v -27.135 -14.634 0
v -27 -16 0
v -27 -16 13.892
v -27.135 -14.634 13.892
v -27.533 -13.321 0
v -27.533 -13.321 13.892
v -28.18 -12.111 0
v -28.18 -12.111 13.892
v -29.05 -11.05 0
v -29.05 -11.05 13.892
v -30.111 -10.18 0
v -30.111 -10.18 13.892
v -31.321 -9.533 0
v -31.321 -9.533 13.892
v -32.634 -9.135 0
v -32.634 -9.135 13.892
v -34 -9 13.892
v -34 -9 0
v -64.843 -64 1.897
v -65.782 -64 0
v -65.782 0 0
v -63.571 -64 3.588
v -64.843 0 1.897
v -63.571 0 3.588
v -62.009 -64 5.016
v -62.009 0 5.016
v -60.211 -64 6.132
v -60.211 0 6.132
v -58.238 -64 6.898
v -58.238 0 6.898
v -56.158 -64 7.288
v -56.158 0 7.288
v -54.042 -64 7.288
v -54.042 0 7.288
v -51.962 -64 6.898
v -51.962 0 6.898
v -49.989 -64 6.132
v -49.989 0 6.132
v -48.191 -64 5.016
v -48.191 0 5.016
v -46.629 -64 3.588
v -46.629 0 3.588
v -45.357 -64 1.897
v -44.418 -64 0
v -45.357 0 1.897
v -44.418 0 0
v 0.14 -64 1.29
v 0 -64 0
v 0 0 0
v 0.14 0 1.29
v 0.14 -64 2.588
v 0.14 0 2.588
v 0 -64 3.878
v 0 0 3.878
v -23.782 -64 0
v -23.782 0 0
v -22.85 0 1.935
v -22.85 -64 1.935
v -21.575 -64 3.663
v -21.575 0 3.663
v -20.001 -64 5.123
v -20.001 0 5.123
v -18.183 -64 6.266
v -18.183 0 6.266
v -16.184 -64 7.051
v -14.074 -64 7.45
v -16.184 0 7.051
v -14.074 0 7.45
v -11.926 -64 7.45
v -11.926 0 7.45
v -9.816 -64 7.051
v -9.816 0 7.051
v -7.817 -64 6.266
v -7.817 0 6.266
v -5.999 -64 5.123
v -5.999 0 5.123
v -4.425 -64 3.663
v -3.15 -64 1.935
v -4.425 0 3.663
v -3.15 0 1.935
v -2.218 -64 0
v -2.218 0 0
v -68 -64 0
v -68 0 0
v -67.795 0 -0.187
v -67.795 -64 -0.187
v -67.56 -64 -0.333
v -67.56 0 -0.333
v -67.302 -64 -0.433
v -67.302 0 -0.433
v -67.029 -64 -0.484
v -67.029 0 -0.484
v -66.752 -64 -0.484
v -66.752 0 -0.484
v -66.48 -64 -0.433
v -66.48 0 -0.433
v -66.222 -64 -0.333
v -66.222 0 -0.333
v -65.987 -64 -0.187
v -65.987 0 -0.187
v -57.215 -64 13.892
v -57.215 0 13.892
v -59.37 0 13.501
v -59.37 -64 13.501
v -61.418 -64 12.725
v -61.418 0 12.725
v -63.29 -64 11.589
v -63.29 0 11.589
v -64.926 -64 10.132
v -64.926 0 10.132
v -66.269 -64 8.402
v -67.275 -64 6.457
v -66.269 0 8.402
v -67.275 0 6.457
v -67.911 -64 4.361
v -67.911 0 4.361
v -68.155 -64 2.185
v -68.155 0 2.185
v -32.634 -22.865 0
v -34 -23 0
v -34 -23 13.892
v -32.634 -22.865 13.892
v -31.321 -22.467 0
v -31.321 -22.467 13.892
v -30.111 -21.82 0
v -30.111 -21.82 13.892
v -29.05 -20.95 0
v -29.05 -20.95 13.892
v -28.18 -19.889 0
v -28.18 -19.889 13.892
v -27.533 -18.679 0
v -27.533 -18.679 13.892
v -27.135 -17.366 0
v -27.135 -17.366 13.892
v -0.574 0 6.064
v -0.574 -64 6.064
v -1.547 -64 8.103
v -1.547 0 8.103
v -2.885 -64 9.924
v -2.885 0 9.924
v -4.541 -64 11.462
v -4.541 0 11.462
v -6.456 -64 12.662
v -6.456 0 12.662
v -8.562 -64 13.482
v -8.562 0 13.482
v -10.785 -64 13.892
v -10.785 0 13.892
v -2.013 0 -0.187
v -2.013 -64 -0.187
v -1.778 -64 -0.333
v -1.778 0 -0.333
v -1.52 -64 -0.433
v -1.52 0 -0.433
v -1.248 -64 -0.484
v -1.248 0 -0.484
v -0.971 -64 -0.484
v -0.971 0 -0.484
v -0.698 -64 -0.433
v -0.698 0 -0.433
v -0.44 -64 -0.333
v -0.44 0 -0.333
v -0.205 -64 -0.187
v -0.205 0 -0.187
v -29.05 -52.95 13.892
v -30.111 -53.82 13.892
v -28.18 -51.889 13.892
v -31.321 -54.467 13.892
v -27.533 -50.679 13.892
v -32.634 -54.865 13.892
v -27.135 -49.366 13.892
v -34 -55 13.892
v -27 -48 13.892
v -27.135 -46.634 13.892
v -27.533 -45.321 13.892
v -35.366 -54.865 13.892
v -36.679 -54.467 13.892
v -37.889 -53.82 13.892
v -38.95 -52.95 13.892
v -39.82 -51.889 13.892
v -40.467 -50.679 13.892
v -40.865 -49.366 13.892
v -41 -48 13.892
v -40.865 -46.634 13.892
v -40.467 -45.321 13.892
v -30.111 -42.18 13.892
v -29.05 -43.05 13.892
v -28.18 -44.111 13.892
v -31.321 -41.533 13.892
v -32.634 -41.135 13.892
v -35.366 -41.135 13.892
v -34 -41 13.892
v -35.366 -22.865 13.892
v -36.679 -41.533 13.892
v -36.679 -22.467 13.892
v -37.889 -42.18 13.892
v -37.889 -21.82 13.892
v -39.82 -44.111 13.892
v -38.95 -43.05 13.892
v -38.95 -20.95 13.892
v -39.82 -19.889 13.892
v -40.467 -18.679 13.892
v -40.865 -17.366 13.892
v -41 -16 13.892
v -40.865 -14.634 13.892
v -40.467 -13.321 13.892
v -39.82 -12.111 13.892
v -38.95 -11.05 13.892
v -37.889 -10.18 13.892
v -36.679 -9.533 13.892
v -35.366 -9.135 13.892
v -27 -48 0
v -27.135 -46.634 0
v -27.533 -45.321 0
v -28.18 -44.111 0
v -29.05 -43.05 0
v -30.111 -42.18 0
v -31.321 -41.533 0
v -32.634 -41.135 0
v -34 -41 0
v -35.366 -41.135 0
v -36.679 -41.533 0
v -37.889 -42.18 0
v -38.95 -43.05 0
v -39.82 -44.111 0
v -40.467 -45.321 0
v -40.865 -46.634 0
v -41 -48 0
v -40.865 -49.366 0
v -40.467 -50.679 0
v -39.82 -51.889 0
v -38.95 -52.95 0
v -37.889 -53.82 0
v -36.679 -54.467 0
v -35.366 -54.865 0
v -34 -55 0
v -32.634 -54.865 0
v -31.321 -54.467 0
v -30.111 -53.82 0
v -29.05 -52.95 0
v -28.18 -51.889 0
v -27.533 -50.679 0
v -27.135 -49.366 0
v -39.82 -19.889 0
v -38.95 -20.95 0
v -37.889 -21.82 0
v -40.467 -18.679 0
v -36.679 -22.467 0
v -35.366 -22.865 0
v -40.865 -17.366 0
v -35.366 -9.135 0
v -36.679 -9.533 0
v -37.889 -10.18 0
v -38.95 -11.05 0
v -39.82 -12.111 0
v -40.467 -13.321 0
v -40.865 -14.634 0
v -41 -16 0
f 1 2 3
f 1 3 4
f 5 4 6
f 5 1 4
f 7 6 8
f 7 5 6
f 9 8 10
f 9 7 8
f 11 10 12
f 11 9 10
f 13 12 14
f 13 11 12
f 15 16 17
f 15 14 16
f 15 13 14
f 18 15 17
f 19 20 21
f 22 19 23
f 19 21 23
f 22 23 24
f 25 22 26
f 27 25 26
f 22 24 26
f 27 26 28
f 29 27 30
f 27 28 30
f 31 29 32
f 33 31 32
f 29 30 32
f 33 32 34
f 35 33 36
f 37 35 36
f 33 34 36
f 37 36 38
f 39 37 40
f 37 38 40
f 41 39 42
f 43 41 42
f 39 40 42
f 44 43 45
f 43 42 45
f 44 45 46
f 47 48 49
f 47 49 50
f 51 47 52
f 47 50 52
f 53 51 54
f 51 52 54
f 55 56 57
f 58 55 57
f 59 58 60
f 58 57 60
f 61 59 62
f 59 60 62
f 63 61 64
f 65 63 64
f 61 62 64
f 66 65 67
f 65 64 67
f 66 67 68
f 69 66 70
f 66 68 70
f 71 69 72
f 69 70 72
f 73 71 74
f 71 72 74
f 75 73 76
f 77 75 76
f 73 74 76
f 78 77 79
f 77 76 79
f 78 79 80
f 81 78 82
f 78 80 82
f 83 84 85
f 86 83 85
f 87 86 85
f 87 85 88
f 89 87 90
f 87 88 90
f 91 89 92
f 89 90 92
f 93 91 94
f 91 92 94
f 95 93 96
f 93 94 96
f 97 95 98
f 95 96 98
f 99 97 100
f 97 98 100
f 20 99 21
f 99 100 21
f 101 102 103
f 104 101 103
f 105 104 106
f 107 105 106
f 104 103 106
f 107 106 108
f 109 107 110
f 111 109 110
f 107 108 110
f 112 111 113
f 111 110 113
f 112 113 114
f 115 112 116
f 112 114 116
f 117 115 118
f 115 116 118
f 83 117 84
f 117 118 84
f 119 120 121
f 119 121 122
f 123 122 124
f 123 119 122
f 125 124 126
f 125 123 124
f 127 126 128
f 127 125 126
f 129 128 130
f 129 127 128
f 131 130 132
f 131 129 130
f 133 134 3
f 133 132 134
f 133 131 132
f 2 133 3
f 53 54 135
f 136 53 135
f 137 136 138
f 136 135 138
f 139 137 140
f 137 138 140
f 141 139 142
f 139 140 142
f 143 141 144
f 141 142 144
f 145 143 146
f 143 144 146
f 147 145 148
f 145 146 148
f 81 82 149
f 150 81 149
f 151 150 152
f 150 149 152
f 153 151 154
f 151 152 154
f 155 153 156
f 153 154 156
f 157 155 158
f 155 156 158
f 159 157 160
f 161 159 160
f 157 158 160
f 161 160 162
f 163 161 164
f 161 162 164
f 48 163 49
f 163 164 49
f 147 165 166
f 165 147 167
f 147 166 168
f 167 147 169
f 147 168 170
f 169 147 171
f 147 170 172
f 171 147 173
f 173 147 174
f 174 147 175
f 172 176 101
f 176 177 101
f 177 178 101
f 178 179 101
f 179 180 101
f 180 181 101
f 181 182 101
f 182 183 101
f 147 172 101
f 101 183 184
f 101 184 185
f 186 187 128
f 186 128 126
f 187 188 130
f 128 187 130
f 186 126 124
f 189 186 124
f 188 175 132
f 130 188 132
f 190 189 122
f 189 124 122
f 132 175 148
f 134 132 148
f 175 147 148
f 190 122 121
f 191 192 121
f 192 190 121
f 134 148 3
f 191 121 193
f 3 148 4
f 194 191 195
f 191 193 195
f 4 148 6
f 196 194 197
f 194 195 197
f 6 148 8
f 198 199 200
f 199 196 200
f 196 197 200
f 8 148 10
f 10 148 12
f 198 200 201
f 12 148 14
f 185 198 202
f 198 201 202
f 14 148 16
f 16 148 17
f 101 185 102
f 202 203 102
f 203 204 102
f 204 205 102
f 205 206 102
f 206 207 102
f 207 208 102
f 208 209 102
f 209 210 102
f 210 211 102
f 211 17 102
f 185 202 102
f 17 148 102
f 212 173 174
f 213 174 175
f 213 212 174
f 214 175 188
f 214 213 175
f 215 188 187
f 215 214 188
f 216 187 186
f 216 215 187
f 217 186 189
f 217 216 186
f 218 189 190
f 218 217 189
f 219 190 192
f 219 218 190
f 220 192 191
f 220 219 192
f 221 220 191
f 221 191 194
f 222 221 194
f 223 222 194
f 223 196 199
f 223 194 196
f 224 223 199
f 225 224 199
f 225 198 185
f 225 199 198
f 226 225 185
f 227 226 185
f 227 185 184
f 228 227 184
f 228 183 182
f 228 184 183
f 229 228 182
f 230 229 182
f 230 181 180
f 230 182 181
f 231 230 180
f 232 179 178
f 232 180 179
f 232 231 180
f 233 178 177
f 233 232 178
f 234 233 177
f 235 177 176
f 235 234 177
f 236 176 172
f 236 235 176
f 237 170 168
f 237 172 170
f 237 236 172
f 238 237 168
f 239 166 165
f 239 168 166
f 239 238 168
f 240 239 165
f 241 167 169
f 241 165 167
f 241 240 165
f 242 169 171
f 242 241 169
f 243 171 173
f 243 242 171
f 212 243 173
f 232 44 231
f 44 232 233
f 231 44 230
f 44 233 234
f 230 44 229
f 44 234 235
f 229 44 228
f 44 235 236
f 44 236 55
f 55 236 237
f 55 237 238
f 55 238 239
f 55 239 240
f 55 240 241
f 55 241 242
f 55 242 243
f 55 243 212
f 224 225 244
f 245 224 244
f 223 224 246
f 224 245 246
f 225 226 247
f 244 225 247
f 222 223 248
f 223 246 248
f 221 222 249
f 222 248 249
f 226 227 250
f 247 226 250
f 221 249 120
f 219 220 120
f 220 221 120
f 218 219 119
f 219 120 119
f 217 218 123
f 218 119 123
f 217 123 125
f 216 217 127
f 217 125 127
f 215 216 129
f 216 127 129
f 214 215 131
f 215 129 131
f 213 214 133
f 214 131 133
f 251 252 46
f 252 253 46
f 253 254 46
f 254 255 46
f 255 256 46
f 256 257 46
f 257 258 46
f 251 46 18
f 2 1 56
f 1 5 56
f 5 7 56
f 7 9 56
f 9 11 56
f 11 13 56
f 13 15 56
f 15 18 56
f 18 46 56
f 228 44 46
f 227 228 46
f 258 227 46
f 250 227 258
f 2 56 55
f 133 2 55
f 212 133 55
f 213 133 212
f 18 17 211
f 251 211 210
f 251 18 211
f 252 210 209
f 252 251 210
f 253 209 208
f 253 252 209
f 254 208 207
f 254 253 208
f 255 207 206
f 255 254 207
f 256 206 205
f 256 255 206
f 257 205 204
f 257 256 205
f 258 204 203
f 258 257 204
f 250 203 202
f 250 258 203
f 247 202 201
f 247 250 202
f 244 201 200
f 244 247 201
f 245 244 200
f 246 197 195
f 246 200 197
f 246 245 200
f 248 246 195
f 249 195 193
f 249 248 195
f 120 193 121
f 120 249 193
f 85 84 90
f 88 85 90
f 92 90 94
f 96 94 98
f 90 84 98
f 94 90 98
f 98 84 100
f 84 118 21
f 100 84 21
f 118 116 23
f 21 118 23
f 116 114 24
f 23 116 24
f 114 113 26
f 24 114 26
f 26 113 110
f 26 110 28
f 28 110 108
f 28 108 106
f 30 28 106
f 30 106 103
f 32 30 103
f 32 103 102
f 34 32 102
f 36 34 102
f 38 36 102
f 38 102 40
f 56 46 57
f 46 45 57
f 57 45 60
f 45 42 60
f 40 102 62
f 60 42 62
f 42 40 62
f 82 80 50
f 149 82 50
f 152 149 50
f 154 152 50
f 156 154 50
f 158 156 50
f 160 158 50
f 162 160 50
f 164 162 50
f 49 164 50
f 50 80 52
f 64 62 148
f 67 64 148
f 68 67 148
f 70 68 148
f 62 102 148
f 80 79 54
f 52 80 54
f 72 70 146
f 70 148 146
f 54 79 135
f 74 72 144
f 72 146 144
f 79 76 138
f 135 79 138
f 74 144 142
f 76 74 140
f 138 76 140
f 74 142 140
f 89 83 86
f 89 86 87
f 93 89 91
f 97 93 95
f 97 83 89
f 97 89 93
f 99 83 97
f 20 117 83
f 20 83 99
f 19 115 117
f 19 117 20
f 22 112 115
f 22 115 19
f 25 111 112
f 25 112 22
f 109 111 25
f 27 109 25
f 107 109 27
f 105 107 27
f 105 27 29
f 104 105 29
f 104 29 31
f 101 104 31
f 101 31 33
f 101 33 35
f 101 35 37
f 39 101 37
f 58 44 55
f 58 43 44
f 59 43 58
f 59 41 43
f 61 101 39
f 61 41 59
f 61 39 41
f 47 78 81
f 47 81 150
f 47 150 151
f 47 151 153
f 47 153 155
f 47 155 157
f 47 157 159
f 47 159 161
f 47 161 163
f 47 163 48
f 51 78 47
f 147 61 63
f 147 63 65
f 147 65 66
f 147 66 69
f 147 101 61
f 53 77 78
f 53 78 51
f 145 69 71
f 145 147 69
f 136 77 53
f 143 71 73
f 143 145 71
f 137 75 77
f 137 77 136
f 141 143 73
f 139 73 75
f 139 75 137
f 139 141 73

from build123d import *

# Parameters (mm, degrees)
F1_DEPTH = 64
F2_R     = 7
F3_DEPTH = 14


with BuildPart() as f1:
    # F0 (on Front) → F1 (new body)
    with BuildSketch(Plane.XZ):
        with BuildLine():
            Line((-44.4183332533, 0), (-34, 0))
            Line((-34, 0), (-23.7819293264, 0))
            ThreePointArc((-23.7819293264, 0), (-13, 7.5), (-2.2180706736, 0))
            ThreePointArc((-2.2180706736, 0), (-1.1090353368, -0.4900293956), (0, 0))
            ThreePointArc((0, 0), (0.1576676396, 1.9388564323), (0, 3.8777128647))
            ThreePointArc((0, 3.8777128647), (-3.676919168, 10.7323783319), (-10.7847960107, 13.8921663032))
            Line((-10.7847960107, 13.8921663032), (-12.8998687101, 13.8921663032))
            Line((-12.8998687101, 13.8921663032), (-13, 13.8921663032))
            Line((-13, 13.8921663032), (-55.1001312899, 13.8921663032))
            Line((-55.1001312899, 13.8921663032), (-57.2152039893, 13.8921663032))
            ThreePointArc((-57.2152039893, 13.8921663032), (-65.6365770881, 9.2975435208), (-68, 0))
            ThreePointArc((-68, 0), (-66.8909646632, -0.4900293956), (-65.7819293264, 0))
            ThreePointArc((-65.7819293264, 0), (-55.1001312899, 7.3366019369), (-44.4183332533, 0))
        make_face()
    extrude(amount=F1_DEPTH)

    # F2 (on Top) → F3 (cut)
    with BuildSketch(Plane.XY):
        with Locations((-34, -48)):
            Circle(F2_R)
        with BuildLine():
            ThreePointArc((-27, -16), (-29.0502525317, -11.0502525317), (-34, -9))
            Line((-34, -9), (-34, -23))
            ThreePointArc((-34, -23), (-29.0502525317, -20.9497474683), (-27, -16))
        make_face()
        with BuildLine():
            Line((-34, -23), (-34, -9))
            ThreePointArc((-34, -9), (-41, -16), (-34, -23))
        make_face()
    extrude(amount=F3_DEPTH, mode=Mode.SUBTRACT)


solid = f1.part
